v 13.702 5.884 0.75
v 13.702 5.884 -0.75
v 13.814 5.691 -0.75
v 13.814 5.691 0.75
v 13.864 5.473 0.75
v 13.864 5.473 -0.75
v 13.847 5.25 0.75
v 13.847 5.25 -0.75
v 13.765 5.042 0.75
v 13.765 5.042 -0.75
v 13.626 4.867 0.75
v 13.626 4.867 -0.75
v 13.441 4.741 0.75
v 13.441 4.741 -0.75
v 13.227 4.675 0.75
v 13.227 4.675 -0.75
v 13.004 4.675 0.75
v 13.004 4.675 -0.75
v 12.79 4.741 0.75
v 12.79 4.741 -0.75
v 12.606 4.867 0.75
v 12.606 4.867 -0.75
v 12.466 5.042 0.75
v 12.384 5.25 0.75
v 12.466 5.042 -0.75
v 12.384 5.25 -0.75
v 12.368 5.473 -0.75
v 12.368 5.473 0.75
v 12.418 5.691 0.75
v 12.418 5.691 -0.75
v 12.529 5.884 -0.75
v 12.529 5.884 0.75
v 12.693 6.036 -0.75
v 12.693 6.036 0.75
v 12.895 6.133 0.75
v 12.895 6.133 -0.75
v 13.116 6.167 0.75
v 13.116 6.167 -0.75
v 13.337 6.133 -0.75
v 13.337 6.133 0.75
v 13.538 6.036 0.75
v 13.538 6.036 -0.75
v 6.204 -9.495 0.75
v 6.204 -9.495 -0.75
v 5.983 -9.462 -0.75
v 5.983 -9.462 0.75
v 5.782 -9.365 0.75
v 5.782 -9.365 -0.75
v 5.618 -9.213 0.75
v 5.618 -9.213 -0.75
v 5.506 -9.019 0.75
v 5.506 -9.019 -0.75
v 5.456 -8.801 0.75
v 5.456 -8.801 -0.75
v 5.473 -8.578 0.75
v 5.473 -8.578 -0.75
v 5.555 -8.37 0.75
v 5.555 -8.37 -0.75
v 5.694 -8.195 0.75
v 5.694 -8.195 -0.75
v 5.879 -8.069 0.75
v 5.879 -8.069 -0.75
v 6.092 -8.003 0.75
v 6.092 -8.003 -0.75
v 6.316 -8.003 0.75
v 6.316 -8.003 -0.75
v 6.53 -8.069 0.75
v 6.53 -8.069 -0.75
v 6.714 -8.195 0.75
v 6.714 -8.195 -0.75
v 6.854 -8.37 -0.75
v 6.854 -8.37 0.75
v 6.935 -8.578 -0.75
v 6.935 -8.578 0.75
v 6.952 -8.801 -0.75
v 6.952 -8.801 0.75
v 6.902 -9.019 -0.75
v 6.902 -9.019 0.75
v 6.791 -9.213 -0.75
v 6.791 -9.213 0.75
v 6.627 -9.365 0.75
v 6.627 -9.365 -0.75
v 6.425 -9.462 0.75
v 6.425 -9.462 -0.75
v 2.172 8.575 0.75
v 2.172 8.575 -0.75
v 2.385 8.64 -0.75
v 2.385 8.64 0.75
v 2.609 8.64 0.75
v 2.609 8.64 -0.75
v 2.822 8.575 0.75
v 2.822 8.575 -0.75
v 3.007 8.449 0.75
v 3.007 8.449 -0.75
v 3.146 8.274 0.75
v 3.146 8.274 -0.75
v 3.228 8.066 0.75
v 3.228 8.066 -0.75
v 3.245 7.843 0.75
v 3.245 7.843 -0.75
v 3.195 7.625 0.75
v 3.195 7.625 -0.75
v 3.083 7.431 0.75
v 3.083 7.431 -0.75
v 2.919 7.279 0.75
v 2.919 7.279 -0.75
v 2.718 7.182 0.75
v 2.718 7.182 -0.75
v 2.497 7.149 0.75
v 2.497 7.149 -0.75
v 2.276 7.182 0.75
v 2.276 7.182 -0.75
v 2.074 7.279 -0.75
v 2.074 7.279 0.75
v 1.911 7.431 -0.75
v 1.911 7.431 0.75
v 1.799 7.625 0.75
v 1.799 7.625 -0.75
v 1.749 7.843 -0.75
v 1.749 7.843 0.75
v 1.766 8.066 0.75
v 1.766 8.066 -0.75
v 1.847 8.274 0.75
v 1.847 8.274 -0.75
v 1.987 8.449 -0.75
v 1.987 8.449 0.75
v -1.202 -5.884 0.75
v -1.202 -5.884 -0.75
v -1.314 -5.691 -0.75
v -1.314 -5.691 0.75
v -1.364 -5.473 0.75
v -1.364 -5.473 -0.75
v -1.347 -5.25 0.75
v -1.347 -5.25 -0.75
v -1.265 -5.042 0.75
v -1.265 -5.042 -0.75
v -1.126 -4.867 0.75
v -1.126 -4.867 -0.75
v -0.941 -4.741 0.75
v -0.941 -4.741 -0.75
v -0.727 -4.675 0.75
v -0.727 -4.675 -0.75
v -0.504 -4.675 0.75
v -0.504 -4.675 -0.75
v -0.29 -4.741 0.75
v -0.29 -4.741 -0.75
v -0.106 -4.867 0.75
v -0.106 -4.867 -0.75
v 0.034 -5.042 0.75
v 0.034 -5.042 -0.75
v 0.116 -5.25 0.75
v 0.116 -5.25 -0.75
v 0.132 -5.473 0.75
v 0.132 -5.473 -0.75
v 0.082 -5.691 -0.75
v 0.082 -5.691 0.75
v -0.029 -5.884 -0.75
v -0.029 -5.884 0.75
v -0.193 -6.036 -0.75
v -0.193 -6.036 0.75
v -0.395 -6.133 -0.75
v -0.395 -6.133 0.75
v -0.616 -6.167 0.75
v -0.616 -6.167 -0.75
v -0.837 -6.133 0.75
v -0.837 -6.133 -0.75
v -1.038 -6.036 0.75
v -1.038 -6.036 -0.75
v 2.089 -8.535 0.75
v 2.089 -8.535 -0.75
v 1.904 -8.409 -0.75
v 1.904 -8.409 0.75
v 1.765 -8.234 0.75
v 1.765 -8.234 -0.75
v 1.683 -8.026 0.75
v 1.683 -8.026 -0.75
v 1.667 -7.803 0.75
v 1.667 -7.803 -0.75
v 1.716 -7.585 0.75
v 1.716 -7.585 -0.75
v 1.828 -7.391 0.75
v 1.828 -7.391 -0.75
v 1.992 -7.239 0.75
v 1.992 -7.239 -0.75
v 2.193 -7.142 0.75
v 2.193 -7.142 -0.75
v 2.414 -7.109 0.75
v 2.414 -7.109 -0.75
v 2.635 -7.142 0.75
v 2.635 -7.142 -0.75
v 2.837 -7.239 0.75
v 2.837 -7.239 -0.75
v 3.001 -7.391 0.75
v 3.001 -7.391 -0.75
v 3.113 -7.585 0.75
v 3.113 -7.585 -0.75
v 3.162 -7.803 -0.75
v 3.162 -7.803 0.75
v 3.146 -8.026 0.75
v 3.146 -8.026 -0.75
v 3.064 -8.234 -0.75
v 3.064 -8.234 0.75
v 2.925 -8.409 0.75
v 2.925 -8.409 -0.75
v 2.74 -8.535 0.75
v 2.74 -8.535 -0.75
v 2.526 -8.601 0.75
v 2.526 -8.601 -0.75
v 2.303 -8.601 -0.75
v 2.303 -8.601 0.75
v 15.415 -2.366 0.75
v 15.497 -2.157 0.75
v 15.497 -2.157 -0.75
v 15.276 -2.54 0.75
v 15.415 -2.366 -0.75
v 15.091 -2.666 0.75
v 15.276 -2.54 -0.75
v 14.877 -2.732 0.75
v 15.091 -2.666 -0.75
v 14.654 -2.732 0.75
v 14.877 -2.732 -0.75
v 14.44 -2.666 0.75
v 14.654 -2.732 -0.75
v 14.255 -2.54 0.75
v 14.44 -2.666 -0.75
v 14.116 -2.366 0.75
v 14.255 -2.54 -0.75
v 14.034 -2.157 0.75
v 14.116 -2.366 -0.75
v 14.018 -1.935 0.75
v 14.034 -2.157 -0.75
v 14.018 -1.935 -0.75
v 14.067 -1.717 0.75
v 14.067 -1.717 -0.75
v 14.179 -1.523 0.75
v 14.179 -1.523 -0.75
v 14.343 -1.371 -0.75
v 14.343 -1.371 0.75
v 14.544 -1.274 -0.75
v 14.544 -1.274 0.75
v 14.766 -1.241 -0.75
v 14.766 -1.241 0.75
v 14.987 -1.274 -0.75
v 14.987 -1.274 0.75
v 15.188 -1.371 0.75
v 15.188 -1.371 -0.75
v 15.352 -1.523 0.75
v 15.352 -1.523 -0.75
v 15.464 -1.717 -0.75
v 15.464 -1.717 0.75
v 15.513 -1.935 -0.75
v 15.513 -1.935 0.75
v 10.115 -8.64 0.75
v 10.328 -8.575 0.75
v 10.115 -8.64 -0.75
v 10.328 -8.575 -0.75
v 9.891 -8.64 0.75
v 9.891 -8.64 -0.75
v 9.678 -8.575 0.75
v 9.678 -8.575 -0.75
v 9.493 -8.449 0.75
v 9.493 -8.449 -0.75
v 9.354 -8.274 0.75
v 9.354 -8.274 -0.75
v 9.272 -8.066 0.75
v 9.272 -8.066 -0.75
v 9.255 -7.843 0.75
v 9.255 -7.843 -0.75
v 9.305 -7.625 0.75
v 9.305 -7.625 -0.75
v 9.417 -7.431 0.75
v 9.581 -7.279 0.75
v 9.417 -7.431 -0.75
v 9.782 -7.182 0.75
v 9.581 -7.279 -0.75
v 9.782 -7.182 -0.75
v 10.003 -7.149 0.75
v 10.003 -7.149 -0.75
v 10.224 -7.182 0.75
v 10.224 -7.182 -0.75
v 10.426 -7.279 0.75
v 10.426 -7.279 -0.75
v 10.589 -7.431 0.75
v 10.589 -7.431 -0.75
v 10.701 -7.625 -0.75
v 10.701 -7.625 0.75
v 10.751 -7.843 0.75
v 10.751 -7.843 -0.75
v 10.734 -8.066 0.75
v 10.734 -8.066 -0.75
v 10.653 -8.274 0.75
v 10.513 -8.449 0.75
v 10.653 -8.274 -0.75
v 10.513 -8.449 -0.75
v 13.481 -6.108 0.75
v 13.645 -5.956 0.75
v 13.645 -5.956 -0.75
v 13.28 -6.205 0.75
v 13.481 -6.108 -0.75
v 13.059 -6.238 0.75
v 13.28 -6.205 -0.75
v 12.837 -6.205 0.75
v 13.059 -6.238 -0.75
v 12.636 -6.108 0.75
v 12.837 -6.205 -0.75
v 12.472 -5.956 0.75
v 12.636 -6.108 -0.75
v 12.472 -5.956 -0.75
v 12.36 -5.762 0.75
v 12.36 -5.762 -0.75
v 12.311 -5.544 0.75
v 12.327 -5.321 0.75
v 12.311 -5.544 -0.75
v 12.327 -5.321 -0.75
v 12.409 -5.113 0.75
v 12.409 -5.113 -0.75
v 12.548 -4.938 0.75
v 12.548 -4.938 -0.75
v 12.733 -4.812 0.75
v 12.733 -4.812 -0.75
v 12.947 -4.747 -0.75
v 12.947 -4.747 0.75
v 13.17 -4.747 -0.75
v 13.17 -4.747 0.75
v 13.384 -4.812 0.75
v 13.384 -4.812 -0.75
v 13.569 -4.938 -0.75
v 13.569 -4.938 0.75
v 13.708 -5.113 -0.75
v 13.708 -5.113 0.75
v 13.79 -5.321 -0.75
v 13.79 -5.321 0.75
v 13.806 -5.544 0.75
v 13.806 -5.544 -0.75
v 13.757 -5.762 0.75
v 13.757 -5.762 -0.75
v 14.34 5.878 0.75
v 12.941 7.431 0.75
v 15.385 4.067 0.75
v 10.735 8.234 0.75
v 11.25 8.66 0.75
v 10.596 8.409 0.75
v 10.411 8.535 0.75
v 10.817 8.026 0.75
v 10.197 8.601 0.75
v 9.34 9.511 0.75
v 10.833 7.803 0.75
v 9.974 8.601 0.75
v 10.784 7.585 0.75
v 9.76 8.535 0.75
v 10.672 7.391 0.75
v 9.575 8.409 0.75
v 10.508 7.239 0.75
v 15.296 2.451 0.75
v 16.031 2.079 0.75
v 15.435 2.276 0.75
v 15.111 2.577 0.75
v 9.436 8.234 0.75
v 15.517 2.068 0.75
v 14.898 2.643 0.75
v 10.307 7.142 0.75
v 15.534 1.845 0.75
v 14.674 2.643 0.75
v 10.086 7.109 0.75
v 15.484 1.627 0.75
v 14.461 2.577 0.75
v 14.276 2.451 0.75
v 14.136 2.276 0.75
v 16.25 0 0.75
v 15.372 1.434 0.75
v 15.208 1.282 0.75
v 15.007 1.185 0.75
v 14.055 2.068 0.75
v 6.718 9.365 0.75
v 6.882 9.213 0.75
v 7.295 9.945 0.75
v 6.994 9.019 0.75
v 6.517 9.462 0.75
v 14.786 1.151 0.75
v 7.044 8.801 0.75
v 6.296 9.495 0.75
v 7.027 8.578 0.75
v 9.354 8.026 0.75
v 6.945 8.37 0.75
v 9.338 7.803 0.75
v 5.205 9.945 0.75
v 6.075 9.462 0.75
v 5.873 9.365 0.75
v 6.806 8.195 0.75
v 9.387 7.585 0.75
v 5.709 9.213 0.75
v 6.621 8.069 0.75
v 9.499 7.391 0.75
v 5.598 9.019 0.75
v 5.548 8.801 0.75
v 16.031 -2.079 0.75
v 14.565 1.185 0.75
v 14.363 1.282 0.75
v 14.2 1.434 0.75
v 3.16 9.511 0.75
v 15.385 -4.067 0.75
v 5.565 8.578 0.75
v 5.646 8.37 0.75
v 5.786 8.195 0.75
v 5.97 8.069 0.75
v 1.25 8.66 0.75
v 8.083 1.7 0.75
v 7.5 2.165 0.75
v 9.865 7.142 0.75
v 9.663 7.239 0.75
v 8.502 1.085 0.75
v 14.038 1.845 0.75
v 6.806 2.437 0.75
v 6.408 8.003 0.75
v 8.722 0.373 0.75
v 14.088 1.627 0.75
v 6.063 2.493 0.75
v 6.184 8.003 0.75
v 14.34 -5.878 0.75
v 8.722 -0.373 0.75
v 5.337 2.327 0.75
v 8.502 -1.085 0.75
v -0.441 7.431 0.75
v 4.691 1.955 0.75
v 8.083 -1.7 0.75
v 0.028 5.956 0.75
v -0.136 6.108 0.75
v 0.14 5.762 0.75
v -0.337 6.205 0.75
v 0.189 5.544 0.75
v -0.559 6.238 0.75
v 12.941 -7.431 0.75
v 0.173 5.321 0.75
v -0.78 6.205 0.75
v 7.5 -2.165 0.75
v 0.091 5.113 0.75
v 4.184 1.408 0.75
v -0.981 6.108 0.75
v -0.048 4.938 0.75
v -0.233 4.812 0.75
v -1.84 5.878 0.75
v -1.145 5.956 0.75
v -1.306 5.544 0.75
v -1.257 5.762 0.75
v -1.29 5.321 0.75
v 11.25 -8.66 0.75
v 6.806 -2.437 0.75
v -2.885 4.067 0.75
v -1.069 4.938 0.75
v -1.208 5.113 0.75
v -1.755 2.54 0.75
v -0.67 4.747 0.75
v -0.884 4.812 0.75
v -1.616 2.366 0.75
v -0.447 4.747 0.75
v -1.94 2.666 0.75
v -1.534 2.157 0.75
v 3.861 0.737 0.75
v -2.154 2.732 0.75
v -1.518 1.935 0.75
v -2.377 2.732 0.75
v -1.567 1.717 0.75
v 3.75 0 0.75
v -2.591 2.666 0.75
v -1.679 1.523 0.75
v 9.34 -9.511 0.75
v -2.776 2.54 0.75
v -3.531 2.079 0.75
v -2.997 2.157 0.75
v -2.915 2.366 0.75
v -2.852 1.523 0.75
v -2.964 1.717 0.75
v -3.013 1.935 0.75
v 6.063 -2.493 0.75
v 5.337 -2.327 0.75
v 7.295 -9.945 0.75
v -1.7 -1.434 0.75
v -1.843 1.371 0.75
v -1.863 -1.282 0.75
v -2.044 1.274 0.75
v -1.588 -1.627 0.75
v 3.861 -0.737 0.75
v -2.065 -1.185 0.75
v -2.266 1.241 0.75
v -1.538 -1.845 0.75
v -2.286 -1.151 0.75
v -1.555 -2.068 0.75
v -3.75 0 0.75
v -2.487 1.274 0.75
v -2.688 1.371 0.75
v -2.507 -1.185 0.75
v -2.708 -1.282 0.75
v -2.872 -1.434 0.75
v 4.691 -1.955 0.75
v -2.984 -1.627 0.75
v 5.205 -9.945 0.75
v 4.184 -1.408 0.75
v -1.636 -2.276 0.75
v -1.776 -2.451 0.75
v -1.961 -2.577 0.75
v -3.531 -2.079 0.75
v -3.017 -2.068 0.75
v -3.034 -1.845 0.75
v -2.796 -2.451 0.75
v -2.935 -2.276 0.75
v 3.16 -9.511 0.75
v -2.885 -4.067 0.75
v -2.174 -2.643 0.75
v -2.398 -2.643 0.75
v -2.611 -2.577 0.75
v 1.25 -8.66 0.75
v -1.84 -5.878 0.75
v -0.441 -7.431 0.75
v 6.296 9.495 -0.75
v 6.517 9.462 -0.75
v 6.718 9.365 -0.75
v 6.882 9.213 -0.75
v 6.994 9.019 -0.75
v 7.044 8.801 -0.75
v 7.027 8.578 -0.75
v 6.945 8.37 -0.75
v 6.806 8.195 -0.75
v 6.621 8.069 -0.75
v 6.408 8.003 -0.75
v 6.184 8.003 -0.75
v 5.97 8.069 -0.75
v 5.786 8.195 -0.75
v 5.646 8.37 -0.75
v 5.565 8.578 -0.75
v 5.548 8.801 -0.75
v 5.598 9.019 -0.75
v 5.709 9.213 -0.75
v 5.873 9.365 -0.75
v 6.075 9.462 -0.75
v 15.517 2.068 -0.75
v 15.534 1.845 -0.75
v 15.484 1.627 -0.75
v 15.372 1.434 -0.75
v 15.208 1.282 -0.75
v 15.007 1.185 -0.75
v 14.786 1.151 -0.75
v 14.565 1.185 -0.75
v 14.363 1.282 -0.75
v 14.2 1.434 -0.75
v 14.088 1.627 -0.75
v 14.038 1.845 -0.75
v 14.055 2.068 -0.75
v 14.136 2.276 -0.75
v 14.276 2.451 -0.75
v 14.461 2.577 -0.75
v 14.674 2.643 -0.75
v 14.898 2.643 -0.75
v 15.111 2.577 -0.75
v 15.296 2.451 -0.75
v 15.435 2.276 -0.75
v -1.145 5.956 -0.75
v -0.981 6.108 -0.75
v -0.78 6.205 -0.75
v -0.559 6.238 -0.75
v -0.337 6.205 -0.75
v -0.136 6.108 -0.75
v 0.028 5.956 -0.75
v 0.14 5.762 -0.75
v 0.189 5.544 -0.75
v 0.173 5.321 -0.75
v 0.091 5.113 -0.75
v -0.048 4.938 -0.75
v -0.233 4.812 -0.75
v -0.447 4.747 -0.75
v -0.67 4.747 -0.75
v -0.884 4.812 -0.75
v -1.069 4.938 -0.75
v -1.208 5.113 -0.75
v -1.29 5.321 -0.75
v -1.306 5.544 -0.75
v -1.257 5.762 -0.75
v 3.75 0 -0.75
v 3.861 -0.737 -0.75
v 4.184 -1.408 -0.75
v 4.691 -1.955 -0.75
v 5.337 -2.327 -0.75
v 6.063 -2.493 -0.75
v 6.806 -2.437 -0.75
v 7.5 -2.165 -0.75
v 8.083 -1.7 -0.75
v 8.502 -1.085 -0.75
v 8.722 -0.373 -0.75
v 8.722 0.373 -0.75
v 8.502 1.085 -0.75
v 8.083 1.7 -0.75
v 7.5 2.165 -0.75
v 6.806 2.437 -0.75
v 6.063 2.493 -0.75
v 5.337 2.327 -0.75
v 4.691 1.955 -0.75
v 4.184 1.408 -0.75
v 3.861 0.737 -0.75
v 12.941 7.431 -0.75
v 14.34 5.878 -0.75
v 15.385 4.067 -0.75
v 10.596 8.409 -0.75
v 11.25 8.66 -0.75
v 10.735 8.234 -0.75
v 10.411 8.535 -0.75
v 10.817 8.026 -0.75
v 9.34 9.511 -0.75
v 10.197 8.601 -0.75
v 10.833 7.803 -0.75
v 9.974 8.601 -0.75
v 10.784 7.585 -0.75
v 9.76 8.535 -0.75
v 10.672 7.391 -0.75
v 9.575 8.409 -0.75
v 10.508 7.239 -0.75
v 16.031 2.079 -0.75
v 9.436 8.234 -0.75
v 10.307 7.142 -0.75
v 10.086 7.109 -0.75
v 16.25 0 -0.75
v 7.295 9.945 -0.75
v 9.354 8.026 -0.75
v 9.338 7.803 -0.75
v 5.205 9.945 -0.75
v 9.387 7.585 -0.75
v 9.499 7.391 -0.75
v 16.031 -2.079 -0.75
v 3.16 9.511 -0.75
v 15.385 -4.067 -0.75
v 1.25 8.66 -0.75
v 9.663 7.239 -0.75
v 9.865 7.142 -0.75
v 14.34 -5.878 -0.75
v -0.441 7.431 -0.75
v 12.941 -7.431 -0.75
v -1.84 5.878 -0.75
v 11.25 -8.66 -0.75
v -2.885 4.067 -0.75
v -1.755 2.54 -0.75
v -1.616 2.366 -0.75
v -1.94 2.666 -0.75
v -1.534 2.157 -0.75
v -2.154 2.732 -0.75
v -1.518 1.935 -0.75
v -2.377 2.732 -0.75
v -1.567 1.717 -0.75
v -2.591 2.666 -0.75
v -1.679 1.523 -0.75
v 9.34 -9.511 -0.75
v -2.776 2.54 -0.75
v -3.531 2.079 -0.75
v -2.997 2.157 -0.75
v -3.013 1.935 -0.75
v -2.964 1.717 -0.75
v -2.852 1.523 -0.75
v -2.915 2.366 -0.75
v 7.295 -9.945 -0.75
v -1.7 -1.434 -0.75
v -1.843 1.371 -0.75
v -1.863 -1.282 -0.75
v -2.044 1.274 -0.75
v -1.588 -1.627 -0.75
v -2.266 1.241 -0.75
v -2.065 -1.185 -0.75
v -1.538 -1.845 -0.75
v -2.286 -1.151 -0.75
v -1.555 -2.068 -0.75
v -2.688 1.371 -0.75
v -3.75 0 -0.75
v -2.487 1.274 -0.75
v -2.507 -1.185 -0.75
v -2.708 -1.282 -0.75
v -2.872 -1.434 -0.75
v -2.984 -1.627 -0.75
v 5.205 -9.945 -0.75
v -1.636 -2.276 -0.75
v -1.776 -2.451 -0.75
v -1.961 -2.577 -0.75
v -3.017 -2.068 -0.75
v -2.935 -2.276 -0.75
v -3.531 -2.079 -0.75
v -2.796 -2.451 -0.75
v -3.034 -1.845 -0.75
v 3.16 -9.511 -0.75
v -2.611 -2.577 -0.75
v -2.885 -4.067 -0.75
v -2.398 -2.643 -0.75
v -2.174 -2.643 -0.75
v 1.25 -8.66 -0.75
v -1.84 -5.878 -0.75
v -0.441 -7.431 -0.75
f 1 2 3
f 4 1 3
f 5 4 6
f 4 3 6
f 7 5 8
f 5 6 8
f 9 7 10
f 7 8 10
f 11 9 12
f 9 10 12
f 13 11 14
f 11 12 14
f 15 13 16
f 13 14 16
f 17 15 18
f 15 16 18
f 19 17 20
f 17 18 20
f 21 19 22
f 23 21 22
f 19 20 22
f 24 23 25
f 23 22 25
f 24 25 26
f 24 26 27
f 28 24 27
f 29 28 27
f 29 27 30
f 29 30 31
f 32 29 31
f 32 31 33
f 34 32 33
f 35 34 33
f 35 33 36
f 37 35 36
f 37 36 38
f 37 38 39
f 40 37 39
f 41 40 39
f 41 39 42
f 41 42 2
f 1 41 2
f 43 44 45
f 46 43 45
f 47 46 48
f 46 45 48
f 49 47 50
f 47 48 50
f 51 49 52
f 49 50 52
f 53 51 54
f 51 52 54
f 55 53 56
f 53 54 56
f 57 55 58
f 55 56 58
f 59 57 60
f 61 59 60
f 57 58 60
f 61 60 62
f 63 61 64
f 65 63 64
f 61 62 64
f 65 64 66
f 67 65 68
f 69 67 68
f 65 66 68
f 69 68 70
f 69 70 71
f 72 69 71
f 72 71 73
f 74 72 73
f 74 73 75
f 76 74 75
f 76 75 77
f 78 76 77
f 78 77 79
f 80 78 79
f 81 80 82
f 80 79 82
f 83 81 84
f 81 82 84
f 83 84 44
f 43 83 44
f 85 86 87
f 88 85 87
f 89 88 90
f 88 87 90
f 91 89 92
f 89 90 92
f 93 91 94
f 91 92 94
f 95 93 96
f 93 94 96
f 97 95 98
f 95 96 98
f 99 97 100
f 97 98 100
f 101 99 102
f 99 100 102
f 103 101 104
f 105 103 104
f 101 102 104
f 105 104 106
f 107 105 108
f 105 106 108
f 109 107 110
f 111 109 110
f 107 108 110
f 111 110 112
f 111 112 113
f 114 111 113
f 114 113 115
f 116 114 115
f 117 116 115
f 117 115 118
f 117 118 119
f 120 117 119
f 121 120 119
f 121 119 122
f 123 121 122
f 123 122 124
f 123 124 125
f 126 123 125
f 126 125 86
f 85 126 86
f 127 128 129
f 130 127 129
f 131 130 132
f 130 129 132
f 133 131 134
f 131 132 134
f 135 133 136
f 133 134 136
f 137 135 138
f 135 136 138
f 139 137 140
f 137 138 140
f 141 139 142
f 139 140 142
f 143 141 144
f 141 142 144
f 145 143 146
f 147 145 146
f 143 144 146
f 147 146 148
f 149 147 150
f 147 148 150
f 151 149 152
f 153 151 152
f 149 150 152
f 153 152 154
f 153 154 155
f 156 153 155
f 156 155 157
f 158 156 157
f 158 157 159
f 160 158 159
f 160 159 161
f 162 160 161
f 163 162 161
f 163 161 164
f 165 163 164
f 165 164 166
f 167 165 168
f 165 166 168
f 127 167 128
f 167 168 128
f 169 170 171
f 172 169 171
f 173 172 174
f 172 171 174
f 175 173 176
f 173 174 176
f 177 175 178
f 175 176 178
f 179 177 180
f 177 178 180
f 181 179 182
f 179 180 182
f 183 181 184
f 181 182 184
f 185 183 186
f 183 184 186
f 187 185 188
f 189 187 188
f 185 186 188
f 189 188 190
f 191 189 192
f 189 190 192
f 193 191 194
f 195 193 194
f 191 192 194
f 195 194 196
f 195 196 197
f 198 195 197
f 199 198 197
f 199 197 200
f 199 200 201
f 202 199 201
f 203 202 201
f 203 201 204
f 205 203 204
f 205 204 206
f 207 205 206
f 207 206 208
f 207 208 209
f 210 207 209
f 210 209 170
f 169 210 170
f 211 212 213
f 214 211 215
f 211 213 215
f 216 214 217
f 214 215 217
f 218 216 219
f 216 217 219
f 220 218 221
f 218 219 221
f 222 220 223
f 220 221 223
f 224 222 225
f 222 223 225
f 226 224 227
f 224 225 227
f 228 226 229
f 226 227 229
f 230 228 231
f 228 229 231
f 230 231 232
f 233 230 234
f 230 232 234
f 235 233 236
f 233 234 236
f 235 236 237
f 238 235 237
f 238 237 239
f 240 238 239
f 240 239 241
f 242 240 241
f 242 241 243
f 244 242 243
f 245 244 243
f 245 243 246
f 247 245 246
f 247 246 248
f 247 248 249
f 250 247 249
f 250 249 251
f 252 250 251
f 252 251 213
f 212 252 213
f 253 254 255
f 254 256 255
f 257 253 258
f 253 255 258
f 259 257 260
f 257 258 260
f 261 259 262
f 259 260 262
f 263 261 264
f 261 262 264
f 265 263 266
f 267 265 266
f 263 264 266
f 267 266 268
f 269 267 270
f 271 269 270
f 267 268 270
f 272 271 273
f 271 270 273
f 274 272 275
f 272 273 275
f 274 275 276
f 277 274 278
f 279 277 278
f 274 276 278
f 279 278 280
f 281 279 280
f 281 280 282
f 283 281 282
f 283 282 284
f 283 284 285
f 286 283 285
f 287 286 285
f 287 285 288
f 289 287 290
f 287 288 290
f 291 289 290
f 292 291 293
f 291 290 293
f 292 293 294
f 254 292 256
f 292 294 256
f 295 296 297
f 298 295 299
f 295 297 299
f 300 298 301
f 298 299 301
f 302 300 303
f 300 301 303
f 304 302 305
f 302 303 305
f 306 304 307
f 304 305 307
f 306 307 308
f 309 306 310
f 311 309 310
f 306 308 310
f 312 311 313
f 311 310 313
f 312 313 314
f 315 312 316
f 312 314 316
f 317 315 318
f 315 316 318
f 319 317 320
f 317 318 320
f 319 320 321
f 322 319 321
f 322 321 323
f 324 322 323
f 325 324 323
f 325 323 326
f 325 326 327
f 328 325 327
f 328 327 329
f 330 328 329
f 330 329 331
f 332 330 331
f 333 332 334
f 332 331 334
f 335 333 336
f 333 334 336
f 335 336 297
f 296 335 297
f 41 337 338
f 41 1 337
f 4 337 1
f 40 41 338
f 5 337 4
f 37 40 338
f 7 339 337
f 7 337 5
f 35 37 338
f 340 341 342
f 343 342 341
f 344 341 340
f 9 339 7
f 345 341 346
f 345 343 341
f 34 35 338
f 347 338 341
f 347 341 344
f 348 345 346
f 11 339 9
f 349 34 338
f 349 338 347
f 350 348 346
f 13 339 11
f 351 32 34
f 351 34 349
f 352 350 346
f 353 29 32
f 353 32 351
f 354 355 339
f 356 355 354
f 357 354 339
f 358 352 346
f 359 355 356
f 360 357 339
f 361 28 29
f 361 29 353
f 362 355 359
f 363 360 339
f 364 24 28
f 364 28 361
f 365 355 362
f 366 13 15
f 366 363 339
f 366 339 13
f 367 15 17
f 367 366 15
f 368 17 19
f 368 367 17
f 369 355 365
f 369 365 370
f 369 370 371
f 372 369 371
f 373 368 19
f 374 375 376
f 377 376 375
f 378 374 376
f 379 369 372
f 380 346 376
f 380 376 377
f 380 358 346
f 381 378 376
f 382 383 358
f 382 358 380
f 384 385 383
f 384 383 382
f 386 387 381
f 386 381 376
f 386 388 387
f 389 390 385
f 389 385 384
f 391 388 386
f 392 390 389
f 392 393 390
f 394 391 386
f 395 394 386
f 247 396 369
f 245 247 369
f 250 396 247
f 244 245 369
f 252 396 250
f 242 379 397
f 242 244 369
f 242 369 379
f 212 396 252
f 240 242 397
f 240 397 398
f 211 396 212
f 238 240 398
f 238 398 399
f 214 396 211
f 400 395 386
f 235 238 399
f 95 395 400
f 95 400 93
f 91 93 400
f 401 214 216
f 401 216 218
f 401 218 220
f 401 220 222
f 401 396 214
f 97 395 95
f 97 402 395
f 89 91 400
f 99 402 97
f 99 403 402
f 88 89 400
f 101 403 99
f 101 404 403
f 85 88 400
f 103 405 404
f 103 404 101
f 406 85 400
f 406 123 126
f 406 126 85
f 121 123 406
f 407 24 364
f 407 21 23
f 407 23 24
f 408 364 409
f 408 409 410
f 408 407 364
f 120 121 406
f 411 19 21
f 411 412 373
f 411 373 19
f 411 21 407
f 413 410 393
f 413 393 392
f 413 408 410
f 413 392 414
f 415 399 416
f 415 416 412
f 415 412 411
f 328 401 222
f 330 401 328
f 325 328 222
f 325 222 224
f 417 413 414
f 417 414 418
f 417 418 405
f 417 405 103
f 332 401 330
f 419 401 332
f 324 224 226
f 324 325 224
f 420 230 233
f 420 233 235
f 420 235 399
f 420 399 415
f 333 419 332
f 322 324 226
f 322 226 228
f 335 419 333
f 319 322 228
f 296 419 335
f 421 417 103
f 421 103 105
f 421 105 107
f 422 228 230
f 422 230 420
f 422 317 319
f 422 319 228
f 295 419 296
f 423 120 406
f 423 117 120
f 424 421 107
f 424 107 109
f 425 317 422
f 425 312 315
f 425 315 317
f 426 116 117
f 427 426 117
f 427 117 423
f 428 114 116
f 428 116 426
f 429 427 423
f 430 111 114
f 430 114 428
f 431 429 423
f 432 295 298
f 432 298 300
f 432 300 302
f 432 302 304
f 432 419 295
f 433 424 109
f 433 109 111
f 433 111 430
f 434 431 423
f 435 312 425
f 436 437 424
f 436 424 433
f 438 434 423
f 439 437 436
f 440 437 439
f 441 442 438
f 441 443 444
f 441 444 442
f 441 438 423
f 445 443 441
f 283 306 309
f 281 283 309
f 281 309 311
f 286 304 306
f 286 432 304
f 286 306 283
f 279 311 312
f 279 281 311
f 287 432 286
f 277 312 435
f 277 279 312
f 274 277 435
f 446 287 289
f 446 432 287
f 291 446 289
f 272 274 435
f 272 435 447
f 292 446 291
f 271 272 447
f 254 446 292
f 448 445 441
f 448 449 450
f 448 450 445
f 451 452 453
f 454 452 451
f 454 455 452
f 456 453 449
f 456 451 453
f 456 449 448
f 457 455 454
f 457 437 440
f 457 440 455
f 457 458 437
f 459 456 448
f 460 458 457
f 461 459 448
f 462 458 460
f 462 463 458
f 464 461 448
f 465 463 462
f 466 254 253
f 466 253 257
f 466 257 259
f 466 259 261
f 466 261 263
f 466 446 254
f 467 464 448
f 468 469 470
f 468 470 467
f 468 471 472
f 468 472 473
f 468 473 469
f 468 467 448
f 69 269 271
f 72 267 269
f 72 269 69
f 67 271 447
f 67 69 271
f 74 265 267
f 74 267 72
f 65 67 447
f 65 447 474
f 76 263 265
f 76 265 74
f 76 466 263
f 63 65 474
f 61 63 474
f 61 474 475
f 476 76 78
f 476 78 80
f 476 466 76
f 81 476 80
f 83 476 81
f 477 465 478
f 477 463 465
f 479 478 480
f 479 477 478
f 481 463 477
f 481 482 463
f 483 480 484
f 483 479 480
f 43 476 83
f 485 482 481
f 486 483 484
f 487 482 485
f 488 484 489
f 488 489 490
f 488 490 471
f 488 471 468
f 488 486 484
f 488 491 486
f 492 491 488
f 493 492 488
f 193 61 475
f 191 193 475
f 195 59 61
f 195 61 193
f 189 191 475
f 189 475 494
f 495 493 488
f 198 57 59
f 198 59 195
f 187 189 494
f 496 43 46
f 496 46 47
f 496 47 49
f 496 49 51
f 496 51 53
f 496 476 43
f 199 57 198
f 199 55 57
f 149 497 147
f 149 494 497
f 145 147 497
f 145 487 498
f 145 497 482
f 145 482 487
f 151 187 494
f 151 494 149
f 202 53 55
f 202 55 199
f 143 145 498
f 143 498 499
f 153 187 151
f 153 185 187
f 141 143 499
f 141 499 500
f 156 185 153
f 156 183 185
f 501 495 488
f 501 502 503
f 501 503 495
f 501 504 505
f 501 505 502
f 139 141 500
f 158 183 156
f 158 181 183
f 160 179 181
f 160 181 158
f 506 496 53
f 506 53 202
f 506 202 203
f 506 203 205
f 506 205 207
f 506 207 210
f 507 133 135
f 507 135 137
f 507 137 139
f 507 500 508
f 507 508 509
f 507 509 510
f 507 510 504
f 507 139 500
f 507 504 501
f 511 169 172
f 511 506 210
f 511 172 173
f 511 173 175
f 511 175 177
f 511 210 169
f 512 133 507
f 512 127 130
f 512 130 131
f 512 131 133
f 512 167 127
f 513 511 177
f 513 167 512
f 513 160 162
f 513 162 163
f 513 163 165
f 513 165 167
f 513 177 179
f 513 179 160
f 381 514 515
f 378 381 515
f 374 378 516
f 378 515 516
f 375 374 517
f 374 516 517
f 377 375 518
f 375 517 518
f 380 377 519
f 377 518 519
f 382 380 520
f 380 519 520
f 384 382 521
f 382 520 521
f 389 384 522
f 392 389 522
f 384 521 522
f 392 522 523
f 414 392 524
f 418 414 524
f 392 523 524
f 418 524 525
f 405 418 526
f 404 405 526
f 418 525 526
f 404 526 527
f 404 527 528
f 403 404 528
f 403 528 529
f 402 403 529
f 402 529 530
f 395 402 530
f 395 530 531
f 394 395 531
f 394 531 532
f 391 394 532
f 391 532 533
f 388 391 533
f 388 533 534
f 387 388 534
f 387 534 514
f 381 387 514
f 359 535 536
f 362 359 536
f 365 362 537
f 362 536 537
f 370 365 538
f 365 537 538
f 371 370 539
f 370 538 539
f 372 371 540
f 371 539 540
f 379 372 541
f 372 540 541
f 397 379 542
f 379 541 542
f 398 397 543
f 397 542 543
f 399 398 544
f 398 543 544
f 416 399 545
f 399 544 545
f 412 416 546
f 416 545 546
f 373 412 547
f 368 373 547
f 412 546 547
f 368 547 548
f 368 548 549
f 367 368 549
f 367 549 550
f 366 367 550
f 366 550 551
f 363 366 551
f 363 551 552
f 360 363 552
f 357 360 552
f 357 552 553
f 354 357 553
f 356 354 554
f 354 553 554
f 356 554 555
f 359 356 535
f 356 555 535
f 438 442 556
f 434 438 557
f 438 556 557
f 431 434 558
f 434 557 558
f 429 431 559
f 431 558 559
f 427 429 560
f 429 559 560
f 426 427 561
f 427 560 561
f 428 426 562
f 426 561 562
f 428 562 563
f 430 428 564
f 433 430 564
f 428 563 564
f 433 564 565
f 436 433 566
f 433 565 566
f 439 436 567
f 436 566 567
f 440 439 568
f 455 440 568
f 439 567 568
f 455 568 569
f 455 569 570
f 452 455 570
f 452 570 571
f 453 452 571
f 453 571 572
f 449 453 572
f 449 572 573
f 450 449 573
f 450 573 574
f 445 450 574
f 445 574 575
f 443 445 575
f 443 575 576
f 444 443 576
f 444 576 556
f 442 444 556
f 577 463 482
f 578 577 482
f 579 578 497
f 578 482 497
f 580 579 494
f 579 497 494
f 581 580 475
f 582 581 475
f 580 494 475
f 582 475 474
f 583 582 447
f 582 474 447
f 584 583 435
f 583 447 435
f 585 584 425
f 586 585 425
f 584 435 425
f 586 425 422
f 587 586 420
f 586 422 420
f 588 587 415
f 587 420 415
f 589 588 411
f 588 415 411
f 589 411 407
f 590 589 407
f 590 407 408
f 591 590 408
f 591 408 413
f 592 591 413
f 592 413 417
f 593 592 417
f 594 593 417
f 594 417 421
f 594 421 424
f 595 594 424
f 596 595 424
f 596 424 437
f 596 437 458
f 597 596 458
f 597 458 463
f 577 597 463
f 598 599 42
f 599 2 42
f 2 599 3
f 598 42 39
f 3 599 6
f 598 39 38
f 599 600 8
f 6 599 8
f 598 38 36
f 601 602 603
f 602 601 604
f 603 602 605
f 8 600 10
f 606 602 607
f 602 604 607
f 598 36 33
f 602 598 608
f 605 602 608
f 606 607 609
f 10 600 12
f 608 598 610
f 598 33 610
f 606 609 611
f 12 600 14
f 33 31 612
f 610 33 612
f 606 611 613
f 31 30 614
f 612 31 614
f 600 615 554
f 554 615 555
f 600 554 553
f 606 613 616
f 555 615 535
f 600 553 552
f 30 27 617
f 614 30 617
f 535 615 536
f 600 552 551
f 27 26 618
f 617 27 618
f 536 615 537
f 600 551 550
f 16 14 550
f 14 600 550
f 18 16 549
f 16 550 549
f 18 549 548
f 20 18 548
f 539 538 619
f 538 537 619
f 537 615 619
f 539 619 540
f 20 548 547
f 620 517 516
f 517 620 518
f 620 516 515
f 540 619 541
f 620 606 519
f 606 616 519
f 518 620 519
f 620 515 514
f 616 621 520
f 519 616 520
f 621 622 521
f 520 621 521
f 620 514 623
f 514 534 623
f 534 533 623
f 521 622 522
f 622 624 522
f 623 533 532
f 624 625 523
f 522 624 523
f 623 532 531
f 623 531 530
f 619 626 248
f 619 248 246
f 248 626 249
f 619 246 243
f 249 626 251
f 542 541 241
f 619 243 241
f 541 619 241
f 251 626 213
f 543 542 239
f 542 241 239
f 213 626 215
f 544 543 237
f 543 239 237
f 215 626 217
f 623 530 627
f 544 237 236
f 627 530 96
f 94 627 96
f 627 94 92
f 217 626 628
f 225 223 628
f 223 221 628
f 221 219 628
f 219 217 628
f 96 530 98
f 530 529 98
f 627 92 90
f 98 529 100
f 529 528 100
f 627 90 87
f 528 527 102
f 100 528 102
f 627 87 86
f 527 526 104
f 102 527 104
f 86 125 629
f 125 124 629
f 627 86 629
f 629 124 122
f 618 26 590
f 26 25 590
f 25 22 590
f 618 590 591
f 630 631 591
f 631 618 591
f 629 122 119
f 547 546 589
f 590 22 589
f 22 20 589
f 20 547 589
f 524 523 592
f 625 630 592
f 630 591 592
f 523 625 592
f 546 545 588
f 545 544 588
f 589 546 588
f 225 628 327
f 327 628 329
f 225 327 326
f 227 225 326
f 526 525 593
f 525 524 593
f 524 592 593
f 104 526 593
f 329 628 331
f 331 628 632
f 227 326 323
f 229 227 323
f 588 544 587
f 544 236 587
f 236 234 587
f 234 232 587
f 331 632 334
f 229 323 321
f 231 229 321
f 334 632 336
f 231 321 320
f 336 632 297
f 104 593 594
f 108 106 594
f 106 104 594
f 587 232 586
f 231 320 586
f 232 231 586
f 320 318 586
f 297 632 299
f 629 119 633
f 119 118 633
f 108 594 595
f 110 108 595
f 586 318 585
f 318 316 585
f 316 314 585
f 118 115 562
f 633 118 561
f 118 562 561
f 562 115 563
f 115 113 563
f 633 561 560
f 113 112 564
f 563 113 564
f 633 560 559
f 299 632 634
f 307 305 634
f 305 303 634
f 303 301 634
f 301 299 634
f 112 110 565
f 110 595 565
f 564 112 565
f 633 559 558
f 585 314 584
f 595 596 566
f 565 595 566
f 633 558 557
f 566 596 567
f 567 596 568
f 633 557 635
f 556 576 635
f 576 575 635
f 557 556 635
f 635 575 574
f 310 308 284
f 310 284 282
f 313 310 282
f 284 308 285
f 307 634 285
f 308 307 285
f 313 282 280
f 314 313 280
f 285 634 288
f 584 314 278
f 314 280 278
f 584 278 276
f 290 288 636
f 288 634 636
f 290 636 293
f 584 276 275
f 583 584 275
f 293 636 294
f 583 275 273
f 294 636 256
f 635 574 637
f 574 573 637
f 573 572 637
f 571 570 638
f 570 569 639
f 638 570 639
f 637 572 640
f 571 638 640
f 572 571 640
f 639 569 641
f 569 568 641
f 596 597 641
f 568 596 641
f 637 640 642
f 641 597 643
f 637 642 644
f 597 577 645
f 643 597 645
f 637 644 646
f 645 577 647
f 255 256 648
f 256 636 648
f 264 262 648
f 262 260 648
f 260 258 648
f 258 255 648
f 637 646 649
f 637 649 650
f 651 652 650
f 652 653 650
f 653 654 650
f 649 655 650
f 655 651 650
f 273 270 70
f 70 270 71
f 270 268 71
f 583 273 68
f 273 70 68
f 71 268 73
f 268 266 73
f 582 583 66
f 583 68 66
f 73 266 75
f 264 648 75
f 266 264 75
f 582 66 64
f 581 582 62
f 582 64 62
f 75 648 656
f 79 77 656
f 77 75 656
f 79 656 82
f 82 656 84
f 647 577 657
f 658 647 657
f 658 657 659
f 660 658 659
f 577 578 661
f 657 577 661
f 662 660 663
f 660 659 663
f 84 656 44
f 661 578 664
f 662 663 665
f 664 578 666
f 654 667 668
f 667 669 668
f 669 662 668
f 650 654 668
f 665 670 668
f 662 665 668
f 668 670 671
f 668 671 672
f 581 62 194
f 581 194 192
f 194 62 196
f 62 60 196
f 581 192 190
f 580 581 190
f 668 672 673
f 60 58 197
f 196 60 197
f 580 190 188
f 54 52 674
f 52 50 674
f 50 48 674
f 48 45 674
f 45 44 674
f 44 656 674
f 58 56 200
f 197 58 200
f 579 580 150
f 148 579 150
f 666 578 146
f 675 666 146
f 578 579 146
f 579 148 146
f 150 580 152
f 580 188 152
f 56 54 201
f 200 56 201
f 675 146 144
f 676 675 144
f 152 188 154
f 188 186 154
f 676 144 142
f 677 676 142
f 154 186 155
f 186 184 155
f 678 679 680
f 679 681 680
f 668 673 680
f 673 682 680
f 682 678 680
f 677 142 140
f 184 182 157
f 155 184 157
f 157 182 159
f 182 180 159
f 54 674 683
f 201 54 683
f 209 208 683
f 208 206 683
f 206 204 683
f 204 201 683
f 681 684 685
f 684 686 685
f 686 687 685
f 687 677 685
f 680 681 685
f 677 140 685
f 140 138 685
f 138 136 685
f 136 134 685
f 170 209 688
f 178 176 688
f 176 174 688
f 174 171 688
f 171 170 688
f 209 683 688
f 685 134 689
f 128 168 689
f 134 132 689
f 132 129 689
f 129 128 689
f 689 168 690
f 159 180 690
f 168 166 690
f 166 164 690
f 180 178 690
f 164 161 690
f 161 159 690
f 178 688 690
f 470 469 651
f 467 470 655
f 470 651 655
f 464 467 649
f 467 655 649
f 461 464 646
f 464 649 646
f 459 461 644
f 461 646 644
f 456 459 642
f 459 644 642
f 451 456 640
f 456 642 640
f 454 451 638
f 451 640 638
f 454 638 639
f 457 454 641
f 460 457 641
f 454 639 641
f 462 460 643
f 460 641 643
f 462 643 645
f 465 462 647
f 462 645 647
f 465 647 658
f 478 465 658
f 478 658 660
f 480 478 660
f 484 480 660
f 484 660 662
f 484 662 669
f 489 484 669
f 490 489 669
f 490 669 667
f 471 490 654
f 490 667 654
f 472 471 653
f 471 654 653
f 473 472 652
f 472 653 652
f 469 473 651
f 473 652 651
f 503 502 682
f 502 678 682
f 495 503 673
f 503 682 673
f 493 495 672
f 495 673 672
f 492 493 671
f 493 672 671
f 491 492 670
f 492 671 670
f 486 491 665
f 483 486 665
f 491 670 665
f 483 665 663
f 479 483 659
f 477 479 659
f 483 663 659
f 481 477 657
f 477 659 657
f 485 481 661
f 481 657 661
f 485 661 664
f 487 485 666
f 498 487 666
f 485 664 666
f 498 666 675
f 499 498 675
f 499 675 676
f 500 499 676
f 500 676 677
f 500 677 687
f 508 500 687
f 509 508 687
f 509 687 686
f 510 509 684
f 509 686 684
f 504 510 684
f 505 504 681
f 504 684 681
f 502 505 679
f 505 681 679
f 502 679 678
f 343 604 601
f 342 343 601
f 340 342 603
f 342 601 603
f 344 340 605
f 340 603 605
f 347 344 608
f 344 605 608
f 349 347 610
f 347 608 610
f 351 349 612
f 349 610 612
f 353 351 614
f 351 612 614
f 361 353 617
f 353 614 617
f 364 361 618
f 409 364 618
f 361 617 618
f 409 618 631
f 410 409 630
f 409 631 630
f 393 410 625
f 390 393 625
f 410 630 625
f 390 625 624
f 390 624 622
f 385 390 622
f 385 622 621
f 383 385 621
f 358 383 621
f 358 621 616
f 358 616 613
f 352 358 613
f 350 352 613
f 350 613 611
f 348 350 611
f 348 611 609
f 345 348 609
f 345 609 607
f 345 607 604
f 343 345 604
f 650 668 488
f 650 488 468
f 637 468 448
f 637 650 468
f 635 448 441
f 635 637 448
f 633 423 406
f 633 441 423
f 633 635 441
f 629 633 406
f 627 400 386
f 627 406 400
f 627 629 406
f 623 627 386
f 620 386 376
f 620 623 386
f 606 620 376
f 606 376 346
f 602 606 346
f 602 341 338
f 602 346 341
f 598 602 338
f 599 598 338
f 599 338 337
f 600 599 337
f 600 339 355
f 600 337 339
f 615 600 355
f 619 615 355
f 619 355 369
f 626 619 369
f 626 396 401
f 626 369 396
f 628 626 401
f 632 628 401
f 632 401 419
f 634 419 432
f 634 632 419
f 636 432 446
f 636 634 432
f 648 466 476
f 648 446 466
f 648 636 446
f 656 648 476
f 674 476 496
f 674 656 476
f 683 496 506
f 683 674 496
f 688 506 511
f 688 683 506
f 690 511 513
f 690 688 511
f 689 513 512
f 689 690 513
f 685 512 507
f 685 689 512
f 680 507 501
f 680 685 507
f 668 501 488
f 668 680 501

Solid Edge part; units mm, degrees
sketch "Sketch1" plane through (0, 0, 0) normal (0, -1, 0) x (1, 0, 0)
  line L0 (3.75, 0.75) -> (-3.75, 0.75)
  line L1 (-3.75, 0.75) -> (-3.75, -0.75)
  line L2 (-3.75, -0.75) -> (3.75, -0.75)
  line L3 (3.75, -0.75) -> (3.75, 0.75)
  dimension "D1" = 2.5
revolve "RevolvedProtrusion1" add sketch "Sketch1" angle 360 about axis through (6.25, 0, -3.2815) along (0, 0, 1)
hole "Hole1" at (6.2958, 8.745, -0.75) direction (0, 0, 1) diameter 1.5 end up to next
pattern_circular "Pattern1" count 14 over 360 about axis through (6.25, 0, 0.75) along (0, 0, -1) of "Hole1"
